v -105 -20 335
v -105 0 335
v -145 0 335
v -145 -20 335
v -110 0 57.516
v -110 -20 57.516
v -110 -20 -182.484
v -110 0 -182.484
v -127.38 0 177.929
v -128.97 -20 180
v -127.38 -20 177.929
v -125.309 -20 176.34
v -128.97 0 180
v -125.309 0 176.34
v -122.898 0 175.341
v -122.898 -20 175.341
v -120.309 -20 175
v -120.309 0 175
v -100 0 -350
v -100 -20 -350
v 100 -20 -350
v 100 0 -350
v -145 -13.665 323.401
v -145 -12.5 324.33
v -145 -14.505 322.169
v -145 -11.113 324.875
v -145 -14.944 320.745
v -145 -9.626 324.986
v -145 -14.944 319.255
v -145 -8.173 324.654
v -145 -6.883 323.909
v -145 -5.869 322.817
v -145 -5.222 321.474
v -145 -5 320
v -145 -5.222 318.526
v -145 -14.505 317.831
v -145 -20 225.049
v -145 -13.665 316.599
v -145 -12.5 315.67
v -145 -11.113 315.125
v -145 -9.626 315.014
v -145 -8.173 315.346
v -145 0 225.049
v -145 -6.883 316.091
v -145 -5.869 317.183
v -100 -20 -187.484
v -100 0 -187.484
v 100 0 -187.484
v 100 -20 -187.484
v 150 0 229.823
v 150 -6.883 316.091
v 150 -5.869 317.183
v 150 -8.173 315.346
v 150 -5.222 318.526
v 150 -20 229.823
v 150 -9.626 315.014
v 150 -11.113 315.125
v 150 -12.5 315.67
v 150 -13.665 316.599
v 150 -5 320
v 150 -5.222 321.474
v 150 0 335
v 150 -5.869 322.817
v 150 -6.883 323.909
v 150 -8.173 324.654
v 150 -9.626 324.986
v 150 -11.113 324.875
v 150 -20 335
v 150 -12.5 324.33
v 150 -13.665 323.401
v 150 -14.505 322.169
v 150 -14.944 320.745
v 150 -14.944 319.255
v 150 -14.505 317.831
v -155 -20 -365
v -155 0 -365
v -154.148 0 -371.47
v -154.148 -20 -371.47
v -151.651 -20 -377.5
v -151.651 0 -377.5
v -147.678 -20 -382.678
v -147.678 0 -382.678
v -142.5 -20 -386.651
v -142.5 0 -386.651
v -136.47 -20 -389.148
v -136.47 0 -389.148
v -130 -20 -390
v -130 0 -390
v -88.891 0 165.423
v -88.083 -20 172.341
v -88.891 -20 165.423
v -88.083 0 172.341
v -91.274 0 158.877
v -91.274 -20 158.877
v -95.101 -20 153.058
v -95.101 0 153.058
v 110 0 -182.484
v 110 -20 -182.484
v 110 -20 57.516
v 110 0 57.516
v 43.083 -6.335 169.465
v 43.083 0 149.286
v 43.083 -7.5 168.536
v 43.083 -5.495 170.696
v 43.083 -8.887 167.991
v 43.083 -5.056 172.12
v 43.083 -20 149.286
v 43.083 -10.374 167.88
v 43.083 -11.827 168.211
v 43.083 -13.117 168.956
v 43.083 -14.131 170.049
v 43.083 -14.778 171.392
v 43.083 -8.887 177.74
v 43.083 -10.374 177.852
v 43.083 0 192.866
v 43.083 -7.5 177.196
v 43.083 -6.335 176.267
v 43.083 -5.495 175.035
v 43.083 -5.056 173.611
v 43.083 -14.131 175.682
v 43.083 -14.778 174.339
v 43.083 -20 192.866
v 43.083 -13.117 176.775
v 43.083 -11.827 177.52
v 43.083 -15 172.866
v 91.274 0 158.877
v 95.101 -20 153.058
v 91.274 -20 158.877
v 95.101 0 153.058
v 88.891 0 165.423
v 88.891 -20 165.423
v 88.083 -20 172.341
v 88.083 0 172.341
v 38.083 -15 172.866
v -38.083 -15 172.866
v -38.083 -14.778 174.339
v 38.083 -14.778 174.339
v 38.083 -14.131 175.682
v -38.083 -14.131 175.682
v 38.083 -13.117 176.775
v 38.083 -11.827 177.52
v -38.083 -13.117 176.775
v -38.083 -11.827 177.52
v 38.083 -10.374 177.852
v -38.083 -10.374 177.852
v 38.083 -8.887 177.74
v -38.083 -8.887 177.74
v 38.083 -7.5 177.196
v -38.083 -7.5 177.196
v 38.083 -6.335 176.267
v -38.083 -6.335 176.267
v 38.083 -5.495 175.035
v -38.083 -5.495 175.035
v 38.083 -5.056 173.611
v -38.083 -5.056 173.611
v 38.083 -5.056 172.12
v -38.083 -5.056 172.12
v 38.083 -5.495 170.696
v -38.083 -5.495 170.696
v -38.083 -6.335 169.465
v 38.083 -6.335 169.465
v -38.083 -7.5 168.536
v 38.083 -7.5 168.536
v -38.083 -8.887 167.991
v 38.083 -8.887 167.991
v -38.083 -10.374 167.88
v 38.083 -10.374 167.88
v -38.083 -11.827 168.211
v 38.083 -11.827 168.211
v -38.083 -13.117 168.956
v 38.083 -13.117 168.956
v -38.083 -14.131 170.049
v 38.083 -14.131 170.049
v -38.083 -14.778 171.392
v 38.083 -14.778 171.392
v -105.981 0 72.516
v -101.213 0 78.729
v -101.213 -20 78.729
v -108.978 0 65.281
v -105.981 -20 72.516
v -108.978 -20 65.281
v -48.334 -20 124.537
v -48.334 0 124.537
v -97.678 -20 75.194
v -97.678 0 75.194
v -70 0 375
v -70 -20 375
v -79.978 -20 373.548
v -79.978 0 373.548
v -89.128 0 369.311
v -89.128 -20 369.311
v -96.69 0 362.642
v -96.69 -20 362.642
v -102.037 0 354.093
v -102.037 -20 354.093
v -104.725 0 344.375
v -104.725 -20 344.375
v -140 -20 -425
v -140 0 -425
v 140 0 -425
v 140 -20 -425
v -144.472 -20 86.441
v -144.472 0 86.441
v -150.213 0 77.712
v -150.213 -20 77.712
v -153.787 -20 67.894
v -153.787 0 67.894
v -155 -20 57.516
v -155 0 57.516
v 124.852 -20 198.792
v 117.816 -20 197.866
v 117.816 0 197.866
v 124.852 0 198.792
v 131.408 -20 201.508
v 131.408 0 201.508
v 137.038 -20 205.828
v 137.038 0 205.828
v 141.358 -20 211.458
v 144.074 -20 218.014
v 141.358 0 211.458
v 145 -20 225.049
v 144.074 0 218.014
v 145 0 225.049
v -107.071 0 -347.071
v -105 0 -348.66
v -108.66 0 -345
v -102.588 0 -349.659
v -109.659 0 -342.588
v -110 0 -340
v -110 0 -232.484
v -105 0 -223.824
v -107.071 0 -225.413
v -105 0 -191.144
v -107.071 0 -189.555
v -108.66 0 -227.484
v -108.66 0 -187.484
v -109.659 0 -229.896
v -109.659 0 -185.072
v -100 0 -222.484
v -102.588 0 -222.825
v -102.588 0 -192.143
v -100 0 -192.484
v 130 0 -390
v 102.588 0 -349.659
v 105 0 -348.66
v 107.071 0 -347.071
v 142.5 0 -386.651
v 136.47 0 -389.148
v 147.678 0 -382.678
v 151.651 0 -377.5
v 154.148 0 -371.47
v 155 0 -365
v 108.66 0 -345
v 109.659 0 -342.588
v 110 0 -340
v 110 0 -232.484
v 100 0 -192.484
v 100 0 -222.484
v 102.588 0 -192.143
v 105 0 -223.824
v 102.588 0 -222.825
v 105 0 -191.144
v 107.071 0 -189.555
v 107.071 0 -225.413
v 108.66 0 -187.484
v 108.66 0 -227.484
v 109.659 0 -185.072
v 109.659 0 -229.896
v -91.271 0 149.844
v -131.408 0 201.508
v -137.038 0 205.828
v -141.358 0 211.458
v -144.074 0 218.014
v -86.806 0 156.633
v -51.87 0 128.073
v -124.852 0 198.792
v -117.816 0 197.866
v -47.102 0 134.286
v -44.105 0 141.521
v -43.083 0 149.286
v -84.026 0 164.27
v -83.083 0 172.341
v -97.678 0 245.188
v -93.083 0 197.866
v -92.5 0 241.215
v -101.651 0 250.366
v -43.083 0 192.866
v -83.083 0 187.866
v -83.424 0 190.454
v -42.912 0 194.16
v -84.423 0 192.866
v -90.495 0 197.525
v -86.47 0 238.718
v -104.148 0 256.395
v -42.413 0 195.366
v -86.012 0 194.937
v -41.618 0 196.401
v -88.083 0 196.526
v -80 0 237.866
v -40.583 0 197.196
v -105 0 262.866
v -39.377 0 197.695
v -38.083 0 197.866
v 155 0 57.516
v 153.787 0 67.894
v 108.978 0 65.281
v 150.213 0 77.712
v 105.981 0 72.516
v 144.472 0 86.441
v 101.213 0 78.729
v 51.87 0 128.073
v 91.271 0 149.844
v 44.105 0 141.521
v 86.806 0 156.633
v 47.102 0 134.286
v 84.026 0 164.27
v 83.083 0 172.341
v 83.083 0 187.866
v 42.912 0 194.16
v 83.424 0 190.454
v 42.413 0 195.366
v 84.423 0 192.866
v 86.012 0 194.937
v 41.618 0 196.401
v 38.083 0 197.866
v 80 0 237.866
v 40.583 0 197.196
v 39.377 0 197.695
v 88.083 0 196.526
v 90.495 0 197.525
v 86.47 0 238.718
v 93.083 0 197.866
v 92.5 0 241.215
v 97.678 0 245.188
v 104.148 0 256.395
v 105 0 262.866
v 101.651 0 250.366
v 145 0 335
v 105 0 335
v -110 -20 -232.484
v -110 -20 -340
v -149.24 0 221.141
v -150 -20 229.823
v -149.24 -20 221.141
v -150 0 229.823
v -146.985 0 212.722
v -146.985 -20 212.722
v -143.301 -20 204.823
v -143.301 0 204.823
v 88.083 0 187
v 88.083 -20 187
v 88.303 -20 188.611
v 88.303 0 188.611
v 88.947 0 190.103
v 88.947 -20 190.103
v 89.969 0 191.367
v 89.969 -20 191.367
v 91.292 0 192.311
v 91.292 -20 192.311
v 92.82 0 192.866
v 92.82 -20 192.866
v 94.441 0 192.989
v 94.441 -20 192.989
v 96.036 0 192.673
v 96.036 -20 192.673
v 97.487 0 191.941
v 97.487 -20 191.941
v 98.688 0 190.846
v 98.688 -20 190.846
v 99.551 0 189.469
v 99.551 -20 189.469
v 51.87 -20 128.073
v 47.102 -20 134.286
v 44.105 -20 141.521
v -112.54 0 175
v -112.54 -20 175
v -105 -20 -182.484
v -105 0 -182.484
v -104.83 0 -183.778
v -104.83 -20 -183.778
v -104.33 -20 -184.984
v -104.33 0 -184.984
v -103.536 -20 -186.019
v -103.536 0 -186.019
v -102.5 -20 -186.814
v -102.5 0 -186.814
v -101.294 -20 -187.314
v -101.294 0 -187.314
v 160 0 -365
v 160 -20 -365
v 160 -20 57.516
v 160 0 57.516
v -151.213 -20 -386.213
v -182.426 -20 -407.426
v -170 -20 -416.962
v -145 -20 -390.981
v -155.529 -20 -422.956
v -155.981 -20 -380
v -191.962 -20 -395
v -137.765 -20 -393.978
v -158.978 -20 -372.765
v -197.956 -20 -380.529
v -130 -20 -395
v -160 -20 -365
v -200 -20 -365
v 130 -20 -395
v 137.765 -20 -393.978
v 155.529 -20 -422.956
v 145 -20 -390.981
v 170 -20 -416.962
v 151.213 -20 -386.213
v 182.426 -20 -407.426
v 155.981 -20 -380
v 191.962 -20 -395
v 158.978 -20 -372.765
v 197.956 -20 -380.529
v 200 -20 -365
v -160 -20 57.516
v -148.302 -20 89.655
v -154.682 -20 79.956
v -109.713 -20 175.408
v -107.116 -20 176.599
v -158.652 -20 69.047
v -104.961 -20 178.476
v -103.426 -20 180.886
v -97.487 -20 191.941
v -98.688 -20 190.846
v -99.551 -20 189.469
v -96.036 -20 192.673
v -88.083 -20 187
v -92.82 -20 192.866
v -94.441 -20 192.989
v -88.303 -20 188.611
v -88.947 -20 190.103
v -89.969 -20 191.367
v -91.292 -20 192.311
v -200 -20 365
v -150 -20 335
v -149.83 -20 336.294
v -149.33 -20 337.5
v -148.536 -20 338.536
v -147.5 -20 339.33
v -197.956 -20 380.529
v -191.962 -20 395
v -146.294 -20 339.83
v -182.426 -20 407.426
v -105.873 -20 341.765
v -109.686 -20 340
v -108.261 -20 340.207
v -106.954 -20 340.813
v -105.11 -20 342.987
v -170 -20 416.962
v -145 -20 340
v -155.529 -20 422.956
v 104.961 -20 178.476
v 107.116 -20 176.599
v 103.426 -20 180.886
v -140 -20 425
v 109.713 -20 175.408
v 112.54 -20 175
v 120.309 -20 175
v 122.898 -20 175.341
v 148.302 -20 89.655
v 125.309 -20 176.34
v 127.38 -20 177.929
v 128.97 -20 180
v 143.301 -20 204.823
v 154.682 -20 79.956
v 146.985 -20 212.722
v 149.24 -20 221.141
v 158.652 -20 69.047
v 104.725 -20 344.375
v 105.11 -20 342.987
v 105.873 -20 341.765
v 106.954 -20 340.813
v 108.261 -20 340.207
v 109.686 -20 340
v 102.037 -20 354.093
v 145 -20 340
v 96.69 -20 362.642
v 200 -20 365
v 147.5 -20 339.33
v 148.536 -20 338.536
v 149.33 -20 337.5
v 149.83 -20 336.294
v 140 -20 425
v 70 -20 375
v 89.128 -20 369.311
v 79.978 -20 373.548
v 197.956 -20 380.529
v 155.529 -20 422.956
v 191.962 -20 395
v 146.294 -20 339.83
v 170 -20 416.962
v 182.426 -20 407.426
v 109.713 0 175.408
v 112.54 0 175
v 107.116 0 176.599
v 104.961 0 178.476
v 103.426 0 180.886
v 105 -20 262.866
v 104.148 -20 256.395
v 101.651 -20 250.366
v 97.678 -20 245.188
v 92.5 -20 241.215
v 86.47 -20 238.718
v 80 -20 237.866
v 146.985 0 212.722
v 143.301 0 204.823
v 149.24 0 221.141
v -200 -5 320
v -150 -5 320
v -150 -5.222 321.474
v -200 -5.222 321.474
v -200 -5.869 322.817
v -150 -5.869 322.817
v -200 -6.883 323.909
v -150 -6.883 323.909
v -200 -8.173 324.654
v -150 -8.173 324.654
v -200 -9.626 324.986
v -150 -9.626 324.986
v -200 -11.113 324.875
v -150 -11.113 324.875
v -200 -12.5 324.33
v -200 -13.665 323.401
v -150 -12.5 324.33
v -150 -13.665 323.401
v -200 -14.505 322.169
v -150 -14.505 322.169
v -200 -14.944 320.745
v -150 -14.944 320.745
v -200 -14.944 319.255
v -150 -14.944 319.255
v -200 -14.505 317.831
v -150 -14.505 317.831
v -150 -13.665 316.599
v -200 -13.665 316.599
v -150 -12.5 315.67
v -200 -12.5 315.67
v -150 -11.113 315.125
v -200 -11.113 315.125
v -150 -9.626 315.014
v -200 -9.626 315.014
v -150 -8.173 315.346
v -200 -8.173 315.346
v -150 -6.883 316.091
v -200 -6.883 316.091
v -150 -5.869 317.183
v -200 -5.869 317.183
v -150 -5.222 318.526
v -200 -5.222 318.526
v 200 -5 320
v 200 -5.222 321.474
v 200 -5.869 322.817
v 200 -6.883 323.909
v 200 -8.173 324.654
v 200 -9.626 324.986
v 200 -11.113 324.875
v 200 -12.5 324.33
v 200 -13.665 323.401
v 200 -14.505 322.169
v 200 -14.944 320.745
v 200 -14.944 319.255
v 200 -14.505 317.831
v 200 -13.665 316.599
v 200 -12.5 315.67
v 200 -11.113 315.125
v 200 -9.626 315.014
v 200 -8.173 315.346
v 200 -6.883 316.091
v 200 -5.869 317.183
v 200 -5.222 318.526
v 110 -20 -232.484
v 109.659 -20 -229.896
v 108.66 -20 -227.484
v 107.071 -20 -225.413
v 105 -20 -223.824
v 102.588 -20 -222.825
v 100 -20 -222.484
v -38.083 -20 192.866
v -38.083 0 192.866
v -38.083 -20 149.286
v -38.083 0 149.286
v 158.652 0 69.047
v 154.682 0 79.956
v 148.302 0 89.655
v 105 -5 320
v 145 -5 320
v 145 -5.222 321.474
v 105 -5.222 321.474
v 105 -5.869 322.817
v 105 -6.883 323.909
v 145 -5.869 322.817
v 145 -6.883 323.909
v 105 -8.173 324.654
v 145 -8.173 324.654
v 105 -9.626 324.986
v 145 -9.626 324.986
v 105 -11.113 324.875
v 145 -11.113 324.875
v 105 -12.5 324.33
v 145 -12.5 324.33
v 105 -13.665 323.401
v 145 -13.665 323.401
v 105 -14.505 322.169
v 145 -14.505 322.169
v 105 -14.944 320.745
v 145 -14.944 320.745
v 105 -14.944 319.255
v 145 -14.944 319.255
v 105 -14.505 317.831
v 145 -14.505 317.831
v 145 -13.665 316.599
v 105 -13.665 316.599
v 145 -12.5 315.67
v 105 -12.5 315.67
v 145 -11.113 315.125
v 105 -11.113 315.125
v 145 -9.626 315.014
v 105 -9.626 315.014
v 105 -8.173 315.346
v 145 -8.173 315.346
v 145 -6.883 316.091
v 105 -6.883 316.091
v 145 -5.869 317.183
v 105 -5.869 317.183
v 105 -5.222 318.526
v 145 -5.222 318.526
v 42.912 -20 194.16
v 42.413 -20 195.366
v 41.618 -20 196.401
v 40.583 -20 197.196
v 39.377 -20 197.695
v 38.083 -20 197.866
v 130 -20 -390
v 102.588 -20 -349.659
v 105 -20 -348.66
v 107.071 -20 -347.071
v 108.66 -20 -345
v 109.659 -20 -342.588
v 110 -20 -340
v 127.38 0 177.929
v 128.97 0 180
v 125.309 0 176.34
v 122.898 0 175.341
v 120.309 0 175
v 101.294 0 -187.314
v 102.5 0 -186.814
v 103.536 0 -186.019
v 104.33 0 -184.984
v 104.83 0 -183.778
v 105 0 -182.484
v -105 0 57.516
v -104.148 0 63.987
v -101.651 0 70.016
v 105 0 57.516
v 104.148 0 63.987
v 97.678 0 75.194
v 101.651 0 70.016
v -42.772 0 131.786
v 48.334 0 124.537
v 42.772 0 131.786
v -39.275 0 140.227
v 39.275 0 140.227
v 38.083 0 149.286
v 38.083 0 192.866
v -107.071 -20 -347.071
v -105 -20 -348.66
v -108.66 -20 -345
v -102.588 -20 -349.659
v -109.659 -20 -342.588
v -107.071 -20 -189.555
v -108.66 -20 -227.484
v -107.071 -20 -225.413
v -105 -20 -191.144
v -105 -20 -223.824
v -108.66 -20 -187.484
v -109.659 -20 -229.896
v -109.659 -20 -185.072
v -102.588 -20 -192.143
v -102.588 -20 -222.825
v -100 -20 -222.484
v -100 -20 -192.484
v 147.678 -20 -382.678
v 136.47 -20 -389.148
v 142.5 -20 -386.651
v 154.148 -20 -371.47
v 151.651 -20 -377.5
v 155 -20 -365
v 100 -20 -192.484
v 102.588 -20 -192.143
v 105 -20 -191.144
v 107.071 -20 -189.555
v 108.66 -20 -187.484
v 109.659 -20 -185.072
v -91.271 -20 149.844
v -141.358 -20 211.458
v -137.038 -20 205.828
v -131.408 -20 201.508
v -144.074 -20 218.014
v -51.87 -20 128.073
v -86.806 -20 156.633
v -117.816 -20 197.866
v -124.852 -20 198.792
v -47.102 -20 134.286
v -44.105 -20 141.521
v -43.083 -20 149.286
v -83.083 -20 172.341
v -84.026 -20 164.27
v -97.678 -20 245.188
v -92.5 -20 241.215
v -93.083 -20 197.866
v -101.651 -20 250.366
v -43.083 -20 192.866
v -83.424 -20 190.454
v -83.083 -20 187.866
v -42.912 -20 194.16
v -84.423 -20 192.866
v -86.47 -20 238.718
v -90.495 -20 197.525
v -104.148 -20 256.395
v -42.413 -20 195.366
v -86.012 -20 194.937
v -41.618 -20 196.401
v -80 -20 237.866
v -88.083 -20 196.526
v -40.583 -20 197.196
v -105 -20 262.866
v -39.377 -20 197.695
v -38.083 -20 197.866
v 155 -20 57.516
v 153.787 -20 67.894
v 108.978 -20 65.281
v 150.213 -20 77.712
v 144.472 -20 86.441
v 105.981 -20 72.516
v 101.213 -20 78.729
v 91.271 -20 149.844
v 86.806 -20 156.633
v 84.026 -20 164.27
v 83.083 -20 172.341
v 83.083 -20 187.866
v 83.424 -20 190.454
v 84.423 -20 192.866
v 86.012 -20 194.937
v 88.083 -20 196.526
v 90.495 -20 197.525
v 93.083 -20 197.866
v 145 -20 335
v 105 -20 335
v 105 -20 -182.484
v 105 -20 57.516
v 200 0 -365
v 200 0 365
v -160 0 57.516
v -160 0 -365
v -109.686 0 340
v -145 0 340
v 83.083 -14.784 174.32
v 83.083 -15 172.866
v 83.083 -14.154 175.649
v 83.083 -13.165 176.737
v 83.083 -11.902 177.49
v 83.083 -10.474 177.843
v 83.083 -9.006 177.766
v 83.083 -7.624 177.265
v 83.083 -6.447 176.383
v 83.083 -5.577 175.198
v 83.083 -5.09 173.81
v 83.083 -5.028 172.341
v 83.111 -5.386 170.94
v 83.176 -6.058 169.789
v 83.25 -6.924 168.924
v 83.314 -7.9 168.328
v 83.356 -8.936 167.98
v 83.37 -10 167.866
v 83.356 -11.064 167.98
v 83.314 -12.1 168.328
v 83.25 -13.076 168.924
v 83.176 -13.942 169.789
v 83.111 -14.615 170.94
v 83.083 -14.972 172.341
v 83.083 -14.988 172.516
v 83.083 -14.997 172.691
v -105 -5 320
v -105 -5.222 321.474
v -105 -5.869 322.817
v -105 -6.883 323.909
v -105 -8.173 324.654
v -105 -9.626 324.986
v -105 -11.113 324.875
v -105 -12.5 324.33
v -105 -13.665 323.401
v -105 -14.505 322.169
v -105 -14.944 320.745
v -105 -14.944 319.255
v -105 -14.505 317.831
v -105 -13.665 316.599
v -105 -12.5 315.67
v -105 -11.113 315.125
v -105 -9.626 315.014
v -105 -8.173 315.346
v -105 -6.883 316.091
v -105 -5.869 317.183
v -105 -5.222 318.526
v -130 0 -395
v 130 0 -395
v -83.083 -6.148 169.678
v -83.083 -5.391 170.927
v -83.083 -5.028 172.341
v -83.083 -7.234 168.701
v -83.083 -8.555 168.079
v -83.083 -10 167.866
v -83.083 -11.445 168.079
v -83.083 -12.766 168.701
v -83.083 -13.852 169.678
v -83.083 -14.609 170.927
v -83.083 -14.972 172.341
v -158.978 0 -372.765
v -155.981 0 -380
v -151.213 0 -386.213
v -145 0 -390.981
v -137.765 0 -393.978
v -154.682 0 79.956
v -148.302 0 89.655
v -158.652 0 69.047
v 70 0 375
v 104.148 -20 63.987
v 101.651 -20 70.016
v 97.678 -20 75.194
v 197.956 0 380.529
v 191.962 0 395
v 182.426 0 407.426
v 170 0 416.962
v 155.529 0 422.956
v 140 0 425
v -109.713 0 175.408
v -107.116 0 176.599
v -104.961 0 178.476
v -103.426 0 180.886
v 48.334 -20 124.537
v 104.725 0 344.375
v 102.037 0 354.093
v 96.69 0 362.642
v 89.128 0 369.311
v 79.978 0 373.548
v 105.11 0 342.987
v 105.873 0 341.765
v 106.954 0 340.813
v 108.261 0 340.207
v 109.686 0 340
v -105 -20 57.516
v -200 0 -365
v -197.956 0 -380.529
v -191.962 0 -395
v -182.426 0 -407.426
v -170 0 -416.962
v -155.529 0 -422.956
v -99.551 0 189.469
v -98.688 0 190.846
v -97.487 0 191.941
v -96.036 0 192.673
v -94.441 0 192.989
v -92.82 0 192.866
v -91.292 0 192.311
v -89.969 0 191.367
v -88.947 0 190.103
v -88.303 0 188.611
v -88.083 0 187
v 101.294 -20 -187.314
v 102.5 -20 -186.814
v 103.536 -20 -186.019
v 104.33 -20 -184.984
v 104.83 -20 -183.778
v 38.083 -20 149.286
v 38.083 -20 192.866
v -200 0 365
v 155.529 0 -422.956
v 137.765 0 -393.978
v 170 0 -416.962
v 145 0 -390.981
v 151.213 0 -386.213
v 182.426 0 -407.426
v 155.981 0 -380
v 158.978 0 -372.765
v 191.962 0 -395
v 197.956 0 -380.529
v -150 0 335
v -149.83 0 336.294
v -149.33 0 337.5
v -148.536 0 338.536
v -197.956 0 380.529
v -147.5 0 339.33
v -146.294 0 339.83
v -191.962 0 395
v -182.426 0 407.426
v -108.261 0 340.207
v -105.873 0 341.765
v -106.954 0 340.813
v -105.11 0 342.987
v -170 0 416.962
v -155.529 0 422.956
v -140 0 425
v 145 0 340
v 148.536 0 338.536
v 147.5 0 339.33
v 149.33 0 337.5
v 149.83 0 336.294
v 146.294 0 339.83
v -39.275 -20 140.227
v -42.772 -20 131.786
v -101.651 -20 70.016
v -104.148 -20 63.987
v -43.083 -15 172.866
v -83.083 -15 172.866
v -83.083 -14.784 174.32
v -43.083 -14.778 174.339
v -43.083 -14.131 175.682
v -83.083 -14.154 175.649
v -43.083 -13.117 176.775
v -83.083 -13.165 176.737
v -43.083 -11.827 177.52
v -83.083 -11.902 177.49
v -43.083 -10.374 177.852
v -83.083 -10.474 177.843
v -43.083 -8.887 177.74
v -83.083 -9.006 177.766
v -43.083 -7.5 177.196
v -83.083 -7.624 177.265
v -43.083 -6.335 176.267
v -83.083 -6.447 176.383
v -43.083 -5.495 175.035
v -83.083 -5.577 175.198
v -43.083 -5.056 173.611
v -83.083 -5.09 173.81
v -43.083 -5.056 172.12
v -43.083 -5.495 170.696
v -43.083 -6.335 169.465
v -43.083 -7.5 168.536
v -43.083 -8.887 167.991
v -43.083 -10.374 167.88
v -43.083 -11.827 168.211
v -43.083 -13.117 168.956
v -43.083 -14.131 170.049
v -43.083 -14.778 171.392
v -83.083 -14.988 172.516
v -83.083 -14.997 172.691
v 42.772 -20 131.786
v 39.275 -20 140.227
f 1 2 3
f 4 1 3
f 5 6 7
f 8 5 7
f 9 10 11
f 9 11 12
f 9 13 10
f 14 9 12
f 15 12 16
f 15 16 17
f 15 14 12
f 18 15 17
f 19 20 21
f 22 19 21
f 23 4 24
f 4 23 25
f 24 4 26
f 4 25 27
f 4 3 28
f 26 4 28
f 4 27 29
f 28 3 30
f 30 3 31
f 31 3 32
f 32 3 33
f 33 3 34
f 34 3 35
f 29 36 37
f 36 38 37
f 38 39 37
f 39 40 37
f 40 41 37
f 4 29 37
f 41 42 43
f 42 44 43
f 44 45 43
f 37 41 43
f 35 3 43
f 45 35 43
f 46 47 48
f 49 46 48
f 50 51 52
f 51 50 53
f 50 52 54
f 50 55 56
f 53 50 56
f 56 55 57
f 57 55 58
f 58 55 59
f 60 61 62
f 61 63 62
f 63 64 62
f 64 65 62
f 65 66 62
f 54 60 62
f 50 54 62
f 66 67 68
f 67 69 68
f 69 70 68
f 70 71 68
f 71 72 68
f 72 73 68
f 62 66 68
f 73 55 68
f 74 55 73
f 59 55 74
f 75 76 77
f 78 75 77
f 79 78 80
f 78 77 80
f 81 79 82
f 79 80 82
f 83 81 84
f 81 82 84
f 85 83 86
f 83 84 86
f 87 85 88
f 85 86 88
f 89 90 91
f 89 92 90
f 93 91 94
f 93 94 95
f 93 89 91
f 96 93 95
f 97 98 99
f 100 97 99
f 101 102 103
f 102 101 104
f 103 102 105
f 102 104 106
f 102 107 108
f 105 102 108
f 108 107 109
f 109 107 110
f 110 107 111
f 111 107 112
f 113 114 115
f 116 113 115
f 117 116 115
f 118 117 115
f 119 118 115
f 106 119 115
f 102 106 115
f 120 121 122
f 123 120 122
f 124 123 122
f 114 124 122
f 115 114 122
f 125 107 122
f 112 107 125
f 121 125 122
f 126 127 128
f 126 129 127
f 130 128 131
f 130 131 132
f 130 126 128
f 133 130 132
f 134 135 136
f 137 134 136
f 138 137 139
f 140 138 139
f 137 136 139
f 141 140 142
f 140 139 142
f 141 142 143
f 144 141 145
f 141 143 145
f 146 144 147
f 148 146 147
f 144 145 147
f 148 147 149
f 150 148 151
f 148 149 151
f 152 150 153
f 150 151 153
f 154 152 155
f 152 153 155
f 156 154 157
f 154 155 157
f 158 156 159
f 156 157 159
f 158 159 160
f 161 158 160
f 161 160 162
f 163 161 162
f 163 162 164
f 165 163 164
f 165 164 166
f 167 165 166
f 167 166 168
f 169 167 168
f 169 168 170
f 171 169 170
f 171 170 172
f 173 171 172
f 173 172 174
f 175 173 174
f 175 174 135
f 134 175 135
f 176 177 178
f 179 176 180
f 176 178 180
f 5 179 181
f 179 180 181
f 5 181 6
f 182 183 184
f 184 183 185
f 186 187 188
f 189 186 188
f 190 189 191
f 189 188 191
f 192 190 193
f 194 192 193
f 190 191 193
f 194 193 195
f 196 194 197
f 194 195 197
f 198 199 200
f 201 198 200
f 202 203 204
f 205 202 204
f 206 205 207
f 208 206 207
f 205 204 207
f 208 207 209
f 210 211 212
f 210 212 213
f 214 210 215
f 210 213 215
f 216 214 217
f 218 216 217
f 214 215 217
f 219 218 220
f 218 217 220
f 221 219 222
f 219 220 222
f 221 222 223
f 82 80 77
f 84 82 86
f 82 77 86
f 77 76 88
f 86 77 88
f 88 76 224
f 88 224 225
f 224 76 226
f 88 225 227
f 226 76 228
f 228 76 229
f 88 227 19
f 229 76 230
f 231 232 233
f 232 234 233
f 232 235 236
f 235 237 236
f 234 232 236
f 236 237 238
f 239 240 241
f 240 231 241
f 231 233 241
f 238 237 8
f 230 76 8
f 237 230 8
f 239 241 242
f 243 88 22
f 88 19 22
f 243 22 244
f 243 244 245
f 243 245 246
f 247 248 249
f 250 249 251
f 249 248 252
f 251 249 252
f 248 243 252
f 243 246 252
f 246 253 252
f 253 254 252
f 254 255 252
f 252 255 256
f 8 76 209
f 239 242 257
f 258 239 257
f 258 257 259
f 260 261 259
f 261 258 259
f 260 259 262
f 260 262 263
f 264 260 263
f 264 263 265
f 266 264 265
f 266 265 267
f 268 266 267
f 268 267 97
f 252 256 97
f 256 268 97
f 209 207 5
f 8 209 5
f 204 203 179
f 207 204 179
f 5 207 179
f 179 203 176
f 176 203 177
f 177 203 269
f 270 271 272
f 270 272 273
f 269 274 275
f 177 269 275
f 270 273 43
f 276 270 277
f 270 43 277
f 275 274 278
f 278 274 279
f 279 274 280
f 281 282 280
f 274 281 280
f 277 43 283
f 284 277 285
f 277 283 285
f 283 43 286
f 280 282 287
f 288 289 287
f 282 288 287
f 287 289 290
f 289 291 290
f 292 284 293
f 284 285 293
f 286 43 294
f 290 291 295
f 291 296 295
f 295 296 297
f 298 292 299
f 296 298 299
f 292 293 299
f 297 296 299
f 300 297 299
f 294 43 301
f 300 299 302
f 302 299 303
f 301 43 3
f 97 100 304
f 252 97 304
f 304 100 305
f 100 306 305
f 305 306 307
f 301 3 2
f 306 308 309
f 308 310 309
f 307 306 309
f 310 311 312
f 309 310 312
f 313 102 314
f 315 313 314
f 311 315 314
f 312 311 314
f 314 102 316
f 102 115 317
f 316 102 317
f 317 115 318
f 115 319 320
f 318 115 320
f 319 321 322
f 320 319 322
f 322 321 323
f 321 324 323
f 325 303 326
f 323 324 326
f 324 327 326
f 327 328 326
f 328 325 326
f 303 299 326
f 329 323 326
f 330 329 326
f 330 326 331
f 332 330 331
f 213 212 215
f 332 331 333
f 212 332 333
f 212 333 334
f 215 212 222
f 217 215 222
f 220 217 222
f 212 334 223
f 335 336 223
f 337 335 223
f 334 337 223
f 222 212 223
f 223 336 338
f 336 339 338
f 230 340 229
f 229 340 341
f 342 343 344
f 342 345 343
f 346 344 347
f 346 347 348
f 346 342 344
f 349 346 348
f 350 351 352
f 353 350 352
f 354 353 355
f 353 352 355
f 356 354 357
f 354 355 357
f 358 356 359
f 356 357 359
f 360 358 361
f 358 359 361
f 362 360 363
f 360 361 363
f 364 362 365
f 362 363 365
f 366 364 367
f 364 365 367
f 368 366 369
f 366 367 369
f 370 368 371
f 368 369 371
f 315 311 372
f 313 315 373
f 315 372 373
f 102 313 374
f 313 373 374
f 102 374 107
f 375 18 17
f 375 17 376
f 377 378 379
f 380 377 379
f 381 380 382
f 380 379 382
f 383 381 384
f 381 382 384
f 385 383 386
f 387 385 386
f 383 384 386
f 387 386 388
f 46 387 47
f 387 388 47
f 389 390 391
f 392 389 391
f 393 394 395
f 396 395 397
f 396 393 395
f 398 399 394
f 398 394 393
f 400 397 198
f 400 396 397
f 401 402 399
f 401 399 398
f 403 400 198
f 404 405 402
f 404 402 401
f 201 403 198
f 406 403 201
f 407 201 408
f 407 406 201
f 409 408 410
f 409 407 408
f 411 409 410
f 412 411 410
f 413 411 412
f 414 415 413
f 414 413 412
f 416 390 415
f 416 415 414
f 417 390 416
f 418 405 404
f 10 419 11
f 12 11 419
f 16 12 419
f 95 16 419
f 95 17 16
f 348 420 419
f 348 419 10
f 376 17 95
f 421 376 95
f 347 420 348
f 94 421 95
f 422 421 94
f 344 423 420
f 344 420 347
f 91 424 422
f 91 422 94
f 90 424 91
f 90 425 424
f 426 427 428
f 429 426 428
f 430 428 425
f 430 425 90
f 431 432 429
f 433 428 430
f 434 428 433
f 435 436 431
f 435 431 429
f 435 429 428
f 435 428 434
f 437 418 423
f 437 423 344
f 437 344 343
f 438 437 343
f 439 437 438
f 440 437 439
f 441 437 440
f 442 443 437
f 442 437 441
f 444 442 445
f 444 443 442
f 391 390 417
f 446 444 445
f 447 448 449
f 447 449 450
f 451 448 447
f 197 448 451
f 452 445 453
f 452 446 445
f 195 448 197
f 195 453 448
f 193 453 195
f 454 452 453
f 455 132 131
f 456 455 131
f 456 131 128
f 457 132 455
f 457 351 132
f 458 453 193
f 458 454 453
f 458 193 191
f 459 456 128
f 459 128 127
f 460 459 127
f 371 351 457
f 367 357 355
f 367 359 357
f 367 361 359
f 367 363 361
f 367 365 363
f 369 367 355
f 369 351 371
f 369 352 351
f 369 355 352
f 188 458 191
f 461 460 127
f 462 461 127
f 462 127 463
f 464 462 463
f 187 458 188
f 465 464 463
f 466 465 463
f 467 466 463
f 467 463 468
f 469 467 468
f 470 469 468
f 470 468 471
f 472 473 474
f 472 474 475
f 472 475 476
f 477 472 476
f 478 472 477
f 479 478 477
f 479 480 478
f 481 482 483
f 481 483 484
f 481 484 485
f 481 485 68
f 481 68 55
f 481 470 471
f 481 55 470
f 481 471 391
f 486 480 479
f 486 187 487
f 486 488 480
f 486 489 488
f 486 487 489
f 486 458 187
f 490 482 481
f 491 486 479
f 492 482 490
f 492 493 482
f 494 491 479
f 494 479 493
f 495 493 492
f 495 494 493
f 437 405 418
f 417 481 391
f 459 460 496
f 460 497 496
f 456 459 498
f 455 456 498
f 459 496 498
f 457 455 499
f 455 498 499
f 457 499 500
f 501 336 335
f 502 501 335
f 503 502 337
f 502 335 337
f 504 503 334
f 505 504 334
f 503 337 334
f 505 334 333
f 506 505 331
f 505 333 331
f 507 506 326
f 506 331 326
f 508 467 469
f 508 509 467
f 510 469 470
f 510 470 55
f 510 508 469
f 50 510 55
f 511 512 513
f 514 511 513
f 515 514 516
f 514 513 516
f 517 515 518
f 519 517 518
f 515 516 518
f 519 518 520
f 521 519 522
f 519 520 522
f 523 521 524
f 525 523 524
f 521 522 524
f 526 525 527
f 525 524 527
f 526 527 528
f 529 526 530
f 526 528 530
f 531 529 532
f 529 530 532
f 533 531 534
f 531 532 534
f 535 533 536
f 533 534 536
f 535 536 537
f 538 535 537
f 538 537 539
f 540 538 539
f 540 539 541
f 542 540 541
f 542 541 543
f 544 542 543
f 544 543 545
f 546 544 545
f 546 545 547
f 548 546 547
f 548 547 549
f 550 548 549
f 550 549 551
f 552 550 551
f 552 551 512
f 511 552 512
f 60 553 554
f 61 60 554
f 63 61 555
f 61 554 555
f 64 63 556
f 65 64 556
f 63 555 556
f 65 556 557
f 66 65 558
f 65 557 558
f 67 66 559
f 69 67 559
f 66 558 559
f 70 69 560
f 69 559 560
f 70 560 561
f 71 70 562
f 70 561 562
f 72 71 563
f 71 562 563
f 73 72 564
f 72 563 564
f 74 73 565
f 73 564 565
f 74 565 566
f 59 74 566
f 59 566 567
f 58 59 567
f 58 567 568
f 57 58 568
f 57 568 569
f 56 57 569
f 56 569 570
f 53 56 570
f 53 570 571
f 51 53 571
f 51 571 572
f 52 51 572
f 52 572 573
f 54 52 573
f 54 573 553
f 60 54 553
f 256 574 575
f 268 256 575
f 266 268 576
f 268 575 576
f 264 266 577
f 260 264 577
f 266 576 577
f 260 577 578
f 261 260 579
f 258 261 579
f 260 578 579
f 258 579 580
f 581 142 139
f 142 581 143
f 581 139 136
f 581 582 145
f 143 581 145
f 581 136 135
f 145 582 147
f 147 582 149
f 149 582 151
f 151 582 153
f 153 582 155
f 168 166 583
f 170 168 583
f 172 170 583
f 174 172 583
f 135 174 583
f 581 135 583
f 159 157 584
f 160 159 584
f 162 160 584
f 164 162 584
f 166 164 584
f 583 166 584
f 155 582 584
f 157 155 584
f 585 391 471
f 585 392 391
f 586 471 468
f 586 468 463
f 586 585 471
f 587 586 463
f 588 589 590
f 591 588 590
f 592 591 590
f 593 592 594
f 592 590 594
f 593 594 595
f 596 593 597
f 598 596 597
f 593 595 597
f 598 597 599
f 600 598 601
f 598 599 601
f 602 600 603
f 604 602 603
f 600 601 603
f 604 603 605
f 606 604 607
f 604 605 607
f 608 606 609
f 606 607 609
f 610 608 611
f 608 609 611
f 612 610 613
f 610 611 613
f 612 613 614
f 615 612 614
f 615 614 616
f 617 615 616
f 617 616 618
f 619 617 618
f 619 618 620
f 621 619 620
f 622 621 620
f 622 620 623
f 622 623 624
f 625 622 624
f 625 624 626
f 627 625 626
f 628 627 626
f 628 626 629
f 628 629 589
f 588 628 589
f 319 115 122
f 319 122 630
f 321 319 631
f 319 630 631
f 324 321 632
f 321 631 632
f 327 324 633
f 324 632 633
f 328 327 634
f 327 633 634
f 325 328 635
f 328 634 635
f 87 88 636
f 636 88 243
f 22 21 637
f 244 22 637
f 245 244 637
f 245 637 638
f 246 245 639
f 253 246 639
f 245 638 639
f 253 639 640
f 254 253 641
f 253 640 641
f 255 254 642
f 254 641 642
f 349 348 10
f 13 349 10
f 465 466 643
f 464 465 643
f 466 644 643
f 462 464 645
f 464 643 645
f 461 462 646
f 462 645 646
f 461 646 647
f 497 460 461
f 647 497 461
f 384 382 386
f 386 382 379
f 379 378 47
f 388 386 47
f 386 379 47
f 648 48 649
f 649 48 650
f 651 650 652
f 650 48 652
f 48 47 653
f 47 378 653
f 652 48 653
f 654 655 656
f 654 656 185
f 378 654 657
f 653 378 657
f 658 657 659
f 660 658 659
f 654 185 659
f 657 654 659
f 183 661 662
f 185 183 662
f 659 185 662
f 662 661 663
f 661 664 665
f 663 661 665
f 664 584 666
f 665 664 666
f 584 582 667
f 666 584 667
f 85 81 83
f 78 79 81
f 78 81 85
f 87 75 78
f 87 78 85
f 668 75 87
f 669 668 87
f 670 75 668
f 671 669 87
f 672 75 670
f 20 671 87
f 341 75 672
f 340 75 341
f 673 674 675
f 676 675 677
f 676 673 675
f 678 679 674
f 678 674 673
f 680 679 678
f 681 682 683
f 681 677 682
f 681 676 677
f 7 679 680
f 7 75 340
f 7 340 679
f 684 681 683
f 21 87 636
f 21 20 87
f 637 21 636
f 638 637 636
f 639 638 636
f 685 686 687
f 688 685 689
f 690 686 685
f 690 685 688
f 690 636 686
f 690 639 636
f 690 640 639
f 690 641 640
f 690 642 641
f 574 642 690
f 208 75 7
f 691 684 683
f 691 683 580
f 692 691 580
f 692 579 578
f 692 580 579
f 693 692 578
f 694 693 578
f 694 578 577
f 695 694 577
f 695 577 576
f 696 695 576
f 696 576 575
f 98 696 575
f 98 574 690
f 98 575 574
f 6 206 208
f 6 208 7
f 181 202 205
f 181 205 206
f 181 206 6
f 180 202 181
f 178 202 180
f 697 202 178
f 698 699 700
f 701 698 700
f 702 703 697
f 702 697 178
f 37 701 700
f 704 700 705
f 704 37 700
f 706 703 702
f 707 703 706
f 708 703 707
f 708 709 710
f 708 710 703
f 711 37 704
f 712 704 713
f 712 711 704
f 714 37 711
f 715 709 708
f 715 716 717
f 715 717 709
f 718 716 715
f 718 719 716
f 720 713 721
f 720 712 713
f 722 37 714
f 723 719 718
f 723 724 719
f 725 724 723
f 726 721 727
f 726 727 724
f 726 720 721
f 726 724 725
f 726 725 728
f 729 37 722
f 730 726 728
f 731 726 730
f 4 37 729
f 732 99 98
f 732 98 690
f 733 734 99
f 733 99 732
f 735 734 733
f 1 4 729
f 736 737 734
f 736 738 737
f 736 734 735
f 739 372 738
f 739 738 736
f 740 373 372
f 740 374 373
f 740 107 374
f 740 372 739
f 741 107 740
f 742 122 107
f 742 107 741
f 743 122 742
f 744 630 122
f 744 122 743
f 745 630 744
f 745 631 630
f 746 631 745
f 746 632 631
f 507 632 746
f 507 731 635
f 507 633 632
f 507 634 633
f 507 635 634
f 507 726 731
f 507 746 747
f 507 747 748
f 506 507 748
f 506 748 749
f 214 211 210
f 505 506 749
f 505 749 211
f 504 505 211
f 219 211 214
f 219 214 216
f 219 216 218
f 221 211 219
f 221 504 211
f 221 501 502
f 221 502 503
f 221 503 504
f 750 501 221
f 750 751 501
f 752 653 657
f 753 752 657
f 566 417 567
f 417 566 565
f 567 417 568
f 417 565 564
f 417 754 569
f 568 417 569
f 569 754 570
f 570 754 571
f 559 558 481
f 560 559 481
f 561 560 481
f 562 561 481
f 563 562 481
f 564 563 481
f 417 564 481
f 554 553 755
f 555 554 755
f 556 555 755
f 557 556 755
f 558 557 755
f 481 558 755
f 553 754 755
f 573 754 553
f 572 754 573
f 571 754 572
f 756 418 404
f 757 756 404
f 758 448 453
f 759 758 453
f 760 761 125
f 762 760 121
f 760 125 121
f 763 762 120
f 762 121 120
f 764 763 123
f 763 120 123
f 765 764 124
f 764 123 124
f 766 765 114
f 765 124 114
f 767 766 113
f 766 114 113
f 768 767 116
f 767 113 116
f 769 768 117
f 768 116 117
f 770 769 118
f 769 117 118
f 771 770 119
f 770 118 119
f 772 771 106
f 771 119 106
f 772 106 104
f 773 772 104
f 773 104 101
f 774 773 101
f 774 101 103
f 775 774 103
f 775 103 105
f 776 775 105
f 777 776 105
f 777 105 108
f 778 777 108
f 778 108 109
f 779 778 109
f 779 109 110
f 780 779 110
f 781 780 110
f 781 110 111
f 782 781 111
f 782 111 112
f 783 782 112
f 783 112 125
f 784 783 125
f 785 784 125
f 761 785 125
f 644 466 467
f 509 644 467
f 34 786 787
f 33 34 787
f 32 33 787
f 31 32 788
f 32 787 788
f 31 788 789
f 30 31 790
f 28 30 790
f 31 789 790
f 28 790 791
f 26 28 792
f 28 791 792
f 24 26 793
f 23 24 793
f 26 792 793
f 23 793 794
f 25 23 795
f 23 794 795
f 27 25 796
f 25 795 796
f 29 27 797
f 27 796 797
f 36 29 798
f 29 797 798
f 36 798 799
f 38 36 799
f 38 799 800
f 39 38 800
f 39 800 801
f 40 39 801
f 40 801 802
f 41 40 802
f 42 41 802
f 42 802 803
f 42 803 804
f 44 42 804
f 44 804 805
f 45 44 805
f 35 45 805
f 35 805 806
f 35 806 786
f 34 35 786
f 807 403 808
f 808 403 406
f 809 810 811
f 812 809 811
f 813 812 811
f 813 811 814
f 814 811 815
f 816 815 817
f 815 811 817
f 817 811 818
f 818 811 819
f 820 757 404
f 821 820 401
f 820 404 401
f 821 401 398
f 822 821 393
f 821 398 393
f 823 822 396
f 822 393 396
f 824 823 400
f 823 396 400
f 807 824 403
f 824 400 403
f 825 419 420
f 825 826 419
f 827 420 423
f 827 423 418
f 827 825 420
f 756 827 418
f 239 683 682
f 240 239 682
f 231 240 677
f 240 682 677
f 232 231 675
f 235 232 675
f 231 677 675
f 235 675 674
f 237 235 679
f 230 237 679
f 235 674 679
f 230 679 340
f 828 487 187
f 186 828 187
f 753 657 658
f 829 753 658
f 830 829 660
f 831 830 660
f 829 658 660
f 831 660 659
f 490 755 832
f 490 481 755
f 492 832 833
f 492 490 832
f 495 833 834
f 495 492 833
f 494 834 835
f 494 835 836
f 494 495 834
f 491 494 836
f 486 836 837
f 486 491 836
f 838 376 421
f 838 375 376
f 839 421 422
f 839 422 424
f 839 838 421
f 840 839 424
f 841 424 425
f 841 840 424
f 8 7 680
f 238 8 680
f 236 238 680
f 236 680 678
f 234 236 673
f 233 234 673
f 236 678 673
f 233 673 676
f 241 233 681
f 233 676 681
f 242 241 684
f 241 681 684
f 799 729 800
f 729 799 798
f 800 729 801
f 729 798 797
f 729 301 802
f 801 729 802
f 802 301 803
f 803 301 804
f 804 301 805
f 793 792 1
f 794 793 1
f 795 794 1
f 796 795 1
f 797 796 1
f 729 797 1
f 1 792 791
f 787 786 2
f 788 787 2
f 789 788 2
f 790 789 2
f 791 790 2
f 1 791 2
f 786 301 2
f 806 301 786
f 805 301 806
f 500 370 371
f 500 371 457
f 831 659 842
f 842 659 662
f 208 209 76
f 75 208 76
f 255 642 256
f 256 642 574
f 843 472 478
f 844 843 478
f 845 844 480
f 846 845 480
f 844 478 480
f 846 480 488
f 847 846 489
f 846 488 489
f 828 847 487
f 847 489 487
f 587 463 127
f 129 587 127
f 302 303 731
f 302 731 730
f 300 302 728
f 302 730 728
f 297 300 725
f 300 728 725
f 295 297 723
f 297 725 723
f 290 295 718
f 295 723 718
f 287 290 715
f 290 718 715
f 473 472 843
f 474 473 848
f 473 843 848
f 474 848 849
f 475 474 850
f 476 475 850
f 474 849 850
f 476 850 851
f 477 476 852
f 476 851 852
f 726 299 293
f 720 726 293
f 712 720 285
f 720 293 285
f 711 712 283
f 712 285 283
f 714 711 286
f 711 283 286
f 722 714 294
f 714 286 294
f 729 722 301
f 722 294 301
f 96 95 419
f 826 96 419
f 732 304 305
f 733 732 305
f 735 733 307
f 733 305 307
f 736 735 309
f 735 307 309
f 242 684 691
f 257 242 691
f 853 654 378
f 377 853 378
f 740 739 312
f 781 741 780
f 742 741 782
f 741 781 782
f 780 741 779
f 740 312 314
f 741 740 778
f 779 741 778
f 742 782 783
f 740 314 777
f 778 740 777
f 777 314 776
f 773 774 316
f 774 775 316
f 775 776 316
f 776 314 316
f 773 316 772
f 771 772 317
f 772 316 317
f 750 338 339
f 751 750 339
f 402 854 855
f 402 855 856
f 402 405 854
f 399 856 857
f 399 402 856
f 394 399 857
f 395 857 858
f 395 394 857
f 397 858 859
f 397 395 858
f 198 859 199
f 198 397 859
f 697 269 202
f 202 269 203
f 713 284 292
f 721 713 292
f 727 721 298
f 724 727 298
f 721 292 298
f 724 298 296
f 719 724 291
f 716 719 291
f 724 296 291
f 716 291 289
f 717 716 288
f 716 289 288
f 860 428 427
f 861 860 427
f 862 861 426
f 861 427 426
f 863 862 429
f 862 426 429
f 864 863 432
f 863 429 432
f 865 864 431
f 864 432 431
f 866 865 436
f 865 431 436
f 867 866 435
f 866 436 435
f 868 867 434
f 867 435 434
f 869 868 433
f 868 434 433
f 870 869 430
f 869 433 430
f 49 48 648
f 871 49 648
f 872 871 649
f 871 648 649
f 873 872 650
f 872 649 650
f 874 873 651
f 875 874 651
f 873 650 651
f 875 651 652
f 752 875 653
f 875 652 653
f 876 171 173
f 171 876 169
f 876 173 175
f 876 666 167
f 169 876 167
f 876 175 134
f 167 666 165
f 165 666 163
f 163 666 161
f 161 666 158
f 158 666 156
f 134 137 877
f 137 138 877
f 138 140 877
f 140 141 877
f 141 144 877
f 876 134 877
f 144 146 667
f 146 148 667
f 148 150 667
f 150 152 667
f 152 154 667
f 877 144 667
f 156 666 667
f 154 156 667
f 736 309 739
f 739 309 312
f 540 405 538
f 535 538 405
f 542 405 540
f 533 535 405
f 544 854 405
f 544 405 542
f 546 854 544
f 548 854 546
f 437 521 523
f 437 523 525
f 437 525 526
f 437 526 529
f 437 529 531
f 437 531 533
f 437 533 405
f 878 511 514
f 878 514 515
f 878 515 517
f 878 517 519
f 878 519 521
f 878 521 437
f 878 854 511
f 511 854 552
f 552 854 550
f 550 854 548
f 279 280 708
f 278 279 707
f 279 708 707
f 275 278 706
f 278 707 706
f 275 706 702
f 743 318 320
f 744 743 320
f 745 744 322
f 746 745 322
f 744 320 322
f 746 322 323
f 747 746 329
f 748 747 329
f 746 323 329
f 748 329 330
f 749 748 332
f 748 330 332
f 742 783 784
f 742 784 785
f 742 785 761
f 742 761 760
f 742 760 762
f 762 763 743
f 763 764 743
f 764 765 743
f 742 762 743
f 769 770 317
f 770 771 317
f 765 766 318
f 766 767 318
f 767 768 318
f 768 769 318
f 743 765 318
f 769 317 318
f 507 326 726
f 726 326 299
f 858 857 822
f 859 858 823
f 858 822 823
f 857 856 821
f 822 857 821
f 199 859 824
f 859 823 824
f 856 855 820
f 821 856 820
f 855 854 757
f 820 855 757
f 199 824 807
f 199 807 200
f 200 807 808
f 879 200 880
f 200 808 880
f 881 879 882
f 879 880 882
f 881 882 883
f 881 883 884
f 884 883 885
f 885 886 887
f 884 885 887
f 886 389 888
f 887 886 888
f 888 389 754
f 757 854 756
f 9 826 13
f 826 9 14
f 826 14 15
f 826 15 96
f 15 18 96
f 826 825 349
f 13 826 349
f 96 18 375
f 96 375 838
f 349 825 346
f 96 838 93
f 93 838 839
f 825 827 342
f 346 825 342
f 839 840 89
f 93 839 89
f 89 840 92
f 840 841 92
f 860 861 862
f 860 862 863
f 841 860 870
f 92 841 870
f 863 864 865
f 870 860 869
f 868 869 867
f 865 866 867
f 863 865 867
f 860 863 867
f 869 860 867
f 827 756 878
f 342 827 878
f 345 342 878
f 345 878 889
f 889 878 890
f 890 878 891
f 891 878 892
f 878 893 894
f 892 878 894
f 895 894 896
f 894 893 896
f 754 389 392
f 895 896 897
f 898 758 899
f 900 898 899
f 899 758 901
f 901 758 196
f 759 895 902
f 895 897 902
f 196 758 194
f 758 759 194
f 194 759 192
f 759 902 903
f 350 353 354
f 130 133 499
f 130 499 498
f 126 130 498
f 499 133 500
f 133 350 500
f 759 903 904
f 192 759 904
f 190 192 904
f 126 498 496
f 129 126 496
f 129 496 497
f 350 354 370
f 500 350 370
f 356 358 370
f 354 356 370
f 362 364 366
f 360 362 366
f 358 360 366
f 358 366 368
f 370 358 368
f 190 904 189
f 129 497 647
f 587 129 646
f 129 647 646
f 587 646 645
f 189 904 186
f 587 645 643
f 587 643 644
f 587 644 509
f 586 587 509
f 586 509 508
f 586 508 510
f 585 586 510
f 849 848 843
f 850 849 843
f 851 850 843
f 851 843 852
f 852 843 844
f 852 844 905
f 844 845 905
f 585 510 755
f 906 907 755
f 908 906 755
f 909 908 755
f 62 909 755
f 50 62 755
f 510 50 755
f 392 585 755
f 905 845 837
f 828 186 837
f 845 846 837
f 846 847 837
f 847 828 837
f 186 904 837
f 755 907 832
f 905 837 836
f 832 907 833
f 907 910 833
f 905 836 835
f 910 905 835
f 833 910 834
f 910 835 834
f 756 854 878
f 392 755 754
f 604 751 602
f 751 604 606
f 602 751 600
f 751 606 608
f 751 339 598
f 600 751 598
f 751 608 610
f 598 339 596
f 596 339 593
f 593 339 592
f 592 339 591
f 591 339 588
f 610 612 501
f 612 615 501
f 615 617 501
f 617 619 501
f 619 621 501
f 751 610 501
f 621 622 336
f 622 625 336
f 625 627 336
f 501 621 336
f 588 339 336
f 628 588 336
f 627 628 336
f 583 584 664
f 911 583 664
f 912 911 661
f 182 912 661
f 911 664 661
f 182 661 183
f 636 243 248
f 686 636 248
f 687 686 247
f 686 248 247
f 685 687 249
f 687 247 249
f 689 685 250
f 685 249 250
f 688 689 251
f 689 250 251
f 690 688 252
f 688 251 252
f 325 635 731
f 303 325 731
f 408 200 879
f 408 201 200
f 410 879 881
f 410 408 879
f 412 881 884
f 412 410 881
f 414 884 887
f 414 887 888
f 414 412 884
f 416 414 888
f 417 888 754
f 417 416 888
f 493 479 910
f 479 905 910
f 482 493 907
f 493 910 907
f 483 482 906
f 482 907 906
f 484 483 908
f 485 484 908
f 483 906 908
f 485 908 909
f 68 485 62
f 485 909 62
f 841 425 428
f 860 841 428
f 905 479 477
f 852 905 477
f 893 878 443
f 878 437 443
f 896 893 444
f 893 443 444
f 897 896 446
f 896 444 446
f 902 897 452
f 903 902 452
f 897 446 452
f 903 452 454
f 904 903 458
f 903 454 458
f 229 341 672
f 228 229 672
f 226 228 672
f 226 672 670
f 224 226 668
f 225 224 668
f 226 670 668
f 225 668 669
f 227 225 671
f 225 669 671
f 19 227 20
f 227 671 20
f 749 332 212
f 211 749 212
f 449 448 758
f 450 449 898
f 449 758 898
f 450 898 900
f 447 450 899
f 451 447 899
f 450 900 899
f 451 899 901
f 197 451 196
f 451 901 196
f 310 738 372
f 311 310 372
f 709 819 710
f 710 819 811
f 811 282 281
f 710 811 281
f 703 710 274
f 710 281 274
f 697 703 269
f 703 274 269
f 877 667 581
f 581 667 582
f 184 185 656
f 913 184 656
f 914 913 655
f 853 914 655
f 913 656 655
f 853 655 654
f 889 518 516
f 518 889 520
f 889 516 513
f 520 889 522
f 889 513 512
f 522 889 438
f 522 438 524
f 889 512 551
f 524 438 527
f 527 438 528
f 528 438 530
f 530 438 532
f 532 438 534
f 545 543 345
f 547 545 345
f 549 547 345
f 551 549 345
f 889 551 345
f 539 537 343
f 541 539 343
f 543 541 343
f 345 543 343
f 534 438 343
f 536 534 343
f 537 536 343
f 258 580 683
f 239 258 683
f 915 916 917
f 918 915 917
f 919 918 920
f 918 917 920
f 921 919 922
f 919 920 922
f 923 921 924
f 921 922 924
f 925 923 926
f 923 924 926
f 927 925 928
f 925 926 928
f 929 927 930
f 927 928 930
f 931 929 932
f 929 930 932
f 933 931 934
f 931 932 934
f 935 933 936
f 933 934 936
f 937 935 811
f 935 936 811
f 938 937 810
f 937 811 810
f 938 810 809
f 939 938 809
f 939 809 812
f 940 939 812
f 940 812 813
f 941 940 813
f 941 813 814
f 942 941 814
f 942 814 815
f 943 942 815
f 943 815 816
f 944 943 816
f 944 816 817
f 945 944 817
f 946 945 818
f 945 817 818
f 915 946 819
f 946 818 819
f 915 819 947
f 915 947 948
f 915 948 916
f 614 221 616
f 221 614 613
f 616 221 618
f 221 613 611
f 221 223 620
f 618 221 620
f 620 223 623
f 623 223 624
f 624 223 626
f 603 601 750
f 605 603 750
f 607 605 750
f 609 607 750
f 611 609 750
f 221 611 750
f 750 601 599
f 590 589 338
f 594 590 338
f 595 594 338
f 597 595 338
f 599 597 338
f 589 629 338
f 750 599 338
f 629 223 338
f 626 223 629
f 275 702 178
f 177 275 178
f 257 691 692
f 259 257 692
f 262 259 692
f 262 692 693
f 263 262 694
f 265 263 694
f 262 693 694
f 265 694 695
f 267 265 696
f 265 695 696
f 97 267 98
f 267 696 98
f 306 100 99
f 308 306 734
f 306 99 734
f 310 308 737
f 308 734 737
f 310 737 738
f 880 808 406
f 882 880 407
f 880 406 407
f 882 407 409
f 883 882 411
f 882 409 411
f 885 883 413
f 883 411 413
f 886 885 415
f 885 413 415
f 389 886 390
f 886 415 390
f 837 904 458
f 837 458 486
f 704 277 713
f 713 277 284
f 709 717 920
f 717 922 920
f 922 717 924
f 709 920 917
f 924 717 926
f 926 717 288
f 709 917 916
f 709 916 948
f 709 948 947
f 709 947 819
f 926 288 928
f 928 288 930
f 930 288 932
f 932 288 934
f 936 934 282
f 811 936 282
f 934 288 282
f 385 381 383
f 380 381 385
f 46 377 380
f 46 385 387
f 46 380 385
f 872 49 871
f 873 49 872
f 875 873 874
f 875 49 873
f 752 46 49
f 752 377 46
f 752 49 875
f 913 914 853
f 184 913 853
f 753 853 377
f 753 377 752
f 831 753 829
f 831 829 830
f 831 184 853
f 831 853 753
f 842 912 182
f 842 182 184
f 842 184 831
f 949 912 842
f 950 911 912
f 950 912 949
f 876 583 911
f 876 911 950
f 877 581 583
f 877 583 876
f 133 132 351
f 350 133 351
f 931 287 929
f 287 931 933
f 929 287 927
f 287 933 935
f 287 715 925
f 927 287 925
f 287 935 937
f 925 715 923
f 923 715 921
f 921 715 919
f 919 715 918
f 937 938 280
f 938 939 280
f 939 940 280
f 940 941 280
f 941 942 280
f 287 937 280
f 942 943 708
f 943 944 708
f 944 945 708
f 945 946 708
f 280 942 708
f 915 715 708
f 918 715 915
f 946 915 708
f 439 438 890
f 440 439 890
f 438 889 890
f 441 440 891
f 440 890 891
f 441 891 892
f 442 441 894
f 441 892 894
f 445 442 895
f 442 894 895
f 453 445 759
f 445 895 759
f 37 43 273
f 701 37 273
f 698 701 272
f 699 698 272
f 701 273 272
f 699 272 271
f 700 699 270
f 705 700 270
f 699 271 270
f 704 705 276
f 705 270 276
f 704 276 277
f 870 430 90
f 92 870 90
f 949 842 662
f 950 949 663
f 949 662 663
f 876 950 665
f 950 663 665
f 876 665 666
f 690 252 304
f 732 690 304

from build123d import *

# Parameters (mm, degrees)
F0_W      = 400
F0_H      = 850
F1_DEPTH  = 20
F2_R      = 60
F4_DEPTH  = 20.001
F5_R      = 50
F6_R      = 10
F7_R      = 30
F8_R      = 50
F9_R      = 5
F11_DEPTH = 20
F13_DEPTH = 25
F15_DEPTH = 20.001
F17_DEPTH = 20
F19_D     = 10
F21_D     = 10
F21_DEPTH = 238.0838139666
F23_D     = 10
F25_D     = 10


with BuildPart() as f1:
    # F0 (on Front) → F1 (new body)
    with BuildSketch(Plane.XZ):
        Rectangle(F0_W, F0_H)
    extrude(amount=F1_DEPTH)

    # F2
    f2_edges = [f1.edges().sort_by_distance(p)[0] for p in [
        (200, -10, 425),
        (-200, -10, 425),
        (-200, -10, -425),
        (200, -10, -425),
    ]]
    fillet(f2_edges, radius=F2_R)

    # F3 (on face) → F4 (cut, through all)
    with BuildSketch(Plane.XZ.offset(20)):
        with BuildLine():
            Line((70, 375), (-70, 375))
            ThreePointArc((-70, 375), (-94.7487373415, 364.7487373415), (-105, 340))
            Line((-105, 340), (-150, 340))
            Line((-150, 340), (-150, 216.4257813839))
            Line((-150, 216.4257813839), (-126.0828139666, 175))
            Line((-126.0828139666, 175), (-106.0828139666, 175))
            Line((-106.0828139666, 175), (-99.5514409332, 189.4686269666))
            ThreePointArc((-99.5514409332, 189.4686269666), (-92.8202296723, 192.8656526406), (-88.0828139666, 187))
            Line((-88.0828139666, 187), (-88.0828139666, 161.4221185446))
            Line((-88.0828139666, 161.4221185446), (-160, 75.71455372))
            Line((-160, 75.71455372), (-160, -365))
            ThreePointArc((-160, -365), (-151.2132034356, -386.2132034356), (-130, -395))
            Line((-130, -395), (130, -395))
            ThreePointArc((130, -395), (151.2132034356, -386.2132034356), (160, -365))
            Line((160, -365), (160, 75.71455372))
            Line((160, 75.71455372), (88.0828139666, 161.4221185446))
            Line((88.0828139666, 161.4221185446), (88.0828139666, 187))
            ThreePointArc((88.0828139666, 187), (92.8202296723, 192.8656526406), (99.5514409332, 189.4686269666))
            Line((99.5514409332, 189.4686269666), (106.0828139666, 175))
            Line((106.0828139666, 175), (126.0828139666, 175))
            Line((126.0828139666, 175), (150, 216.4257813839))
            Line((150, 216.4257813839), (150, 340))
            Line((150, 340), (105, 340))
            ThreePointArc((105, 340), (94.7487373415, 364.7487373415), (70, 375))
        make_face()
    extrude(amount=-F4_DEPTH, mode=Mode.SUBTRACT)

    # F5
    f5_edges = [f1.edges().sort_by_distance(p)[0] for p in [
        (-150, -10, 216.425781),
        (150, -10, 216.425781),
    ]]
    fillet(f5_edges, radius=F5_R)

    # F6
    f6_edges = [f1.edges().sort_by_distance(p)[0] for p in [
        (126.082814, -10, 175),
        (-126.082814, -10, 175),
        (106.082814, -10, 175),
        (-106.082814, -10, 175),
    ]]
    fillet(f6_edges, radius=F6_R)

    # F7
    f7_edges = [f1.edges().sort_by_distance(p)[0] for p in [
        (-88.082814, -10, 161.422119),
        (88.082814, -10, 161.422119),
    ]]
    fillet(f7_edges, radius=F7_R)

    # F8
    f8_edges = [f1.edges().sort_by_distance(p)[0] for p in [
        (-160, -10, 75.714554),
        (160, -10, 75.714554),
    ]]
    fillet(f8_edges, radius=F8_R)

    # F9
    f9_edges = [f1.edges().sort_by_distance(p)[0] for p in [
        (-150, -10, 340),
        (-105, -10, 340),
        (150, -10, 340),
        (105, -10, 340),
    ]]
    fillet(f9_edges, radius=F9_R)

    # F25 (through all)
    with Locations(Plane(origin=(-200, 0, 0), x_dir=(0, -1, 0), z_dir=(-1, 0, 0))):
        with Locations((10, 320)):
            Hole(F25_D / 2)


with BuildPart() as f11:
    # F10 (on Front) → F11 (new body)
    with BuildSketch(Plane.XZ):
        with BuildLine():
            Line((-105, 262.8656526406), (-105, 335))
            Line((-105, 335), (-145, 335))
            Line((-145, 335), (-145, 225.0493870204))
            ThreePointArc((-145, 225.0493870204), (-137.0380685381, 205.8275841024), (-117.8162656202, 197.8656526406))
            Line((-117.8162656202, 197.8656526406), (-93.0828139666, 197.8656526406))
            ThreePointArc((-93.0828139666, 197.8656526406), (-86.0117461547, 194.9367204524), (-83.0828139666, 187.8656526406))
            Line((-83.0828139666, 187.8656526406), (-83.0828139666, 172.3412255726))
            ThreePointArc((-83.0828139666, 172.3412255726), (-85.1935722391, 160.3705205562), (-91.2712584574, 149.8436592335))
            Line((-91.2712584574, 149.8436592335), (-144.4719999404, 86.4414844426))
            ThreePointArc((-144.4719999404, 86.4414844426), (-152.2861679354, 72.9069484564), (-155, 57.5160420067))
            Line((-155, 57.5160420067), (-155, -365))
            ThreePointArc((-155, -365), (-147.6776695297, -382.6776695297), (-130, -390))
            Line((-130, -390), (0, -390))
            Line((0, -390), (130, -390))
            ThreePointArc((130, -390), (147.6776695297, -382.6776695297), (155, -365))
            Line((155, -365), (155, 57.5160420067))
            ThreePointArc((155, 57.5160420067), (152.2861679354, 72.9069484564), (144.4719999404, 86.4414844426))
            Line((144.4719999404, 86.4414844426), (91.2712584574, 149.8436592335))
            ThreePointArc((91.2712584574, 149.8436592335), (85.1935722391, 160.3705205562), (83.0828139666, 172.3412255726))
            Line((83.0828139666, 172.3412255726), (83.0828139666, 187.8656526406))
            ThreePointArc((83.0828139666, 187.8656526406), (86.0117461547, 194.9367204524), (93.0828139666, 197.8656526406))
            Line((93.0828139666, 197.8656526406), (117.8162656202, 197.8656526406))
            ThreePointArc((117.8162656202, 197.8656526406), (137.0380685381, 205.8275841024), (145, 225.0493870204))
            Line((145, 225.0493870204), (145, 335))
            Line((145, 335), (105, 335))
            Line((105, 335), (105, 262.8656526406))
            ThreePointArc((105, 262.8656526406), (97.6776695297, 245.1879831109), (80, 237.8656526406))
            Line((80, 237.8656526406), (0, 237.8656526406))
            Line((0, 237.8656526406), (-80, 237.8656526406))
            ThreePointArc((-80, 237.8656526406), (-97.6776695297, 245.1879831109), (-105, 262.8656526406))
        make_face()
    extrude(amount=F11_DEPTH)

    # F12 (on face) → F13 (cut)
    with BuildSketch(Plane.XZ.offset(20)):
        with BuildLine():
            Line((38.0828139666, 197.8656526406), (-38.0828139666, 197.8656526406))
            ThreePointArc((-38.0828139666, 197.8656526406), (-41.6183478725, 196.4011865465), (-43.0828139666, 192.8656526406))
            Line((-43.0828139666, 192.8656526406), (-43.0828139666, 149.2860417825))
            ThreePointArc((-43.0828139666, 149.2860417825), (-45.3664279913, 137.8055388115), (-51.869610531, 128.0728383469))
            Line((-51.869610531, 128.0728383469), (-101.2132034356, 78.7292454423))
            ThreePointArc((-101.2132034356, 78.7292454423), (-107.7163859753, 68.9965449777), (-110, 57.5160420067))
            Line((-110, 57.5160420067), (-110, -182.4839579933))
            ThreePointArc((-110, -182.4839579933), (-107.0710678119, -189.5550258052), (-100, -192.4839579933))
            Line((-100, -192.4839579933), (0, -192.4839579933))
            Line((0, -192.4839579933), (100, -192.4839579933))
            ThreePointArc((100, -192.4839579933), (107.0710678119, -189.5550258052), (110, -182.4839579933))
            Line((110, -182.4839579933), (110, 57.5160420067))
            ThreePointArc((110, 57.5160420067), (107.7163859753, 68.9965449777), (101.2132034356, 78.7292454423))
            Line((101.2132034356, 78.7292454423), (51.869610531, 128.0728383469))
            ThreePointArc((51.869610531, 128.0728383469), (45.3664279913, 137.8055388115), (43.0828139666, 149.2860417825))
            Line((43.0828139666, 149.2860417825), (43.0828139666, 192.8656526406))
            ThreePointArc((43.0828139666, 192.8656526406), (41.6183478725, 196.4011865465), (38.0828139666, 197.8656526406))
        make_face()
    extrude(amount=-F13_DEPTH, mode=Mode.SUBTRACT)

    # F14 (on face) → F15 (cut, through all)
    with BuildSketch(Plane.XZ.offset(20)):
        with BuildLine():
            Line((0, -222.4839579933), (-100, -222.4839579933))
            ThreePointArc((-100, -222.4839579933), (-107.0710678119, -225.4128901814), (-110, -232.4839579933))
            Line((-110, -232.4839579933), (-110, -340))
            ThreePointArc((-110, -340), (-107.0710678119, -347.0710678119), (-100, -350))
            Line((-100, -350), (0, -350))
            Line((0, -350), (0, -222.4839579933))
        make_face()
        with BuildLine():
            Line((100, -222.4839579933), (0, -222.4839579933))
            Line((0, -222.4839579933), (0, -350))
            Line((0, -350), (100, -350))
            ThreePointArc((100, -350), (107.0710678119, -347.0710678119), (110, -340))
            Line((110, -340), (110, -232.4839579933))
            ThreePointArc((110, -232.4839579933), (107.0710678119, -225.4128901814), (100, -222.4839579933))
        make_face()
    extrude(amount=-F15_DEPTH, mode=Mode.SUBTRACT)

    # F21 (through all, one way)
    with BuildSketch(Plane(origin=(-83.0828139666, 0, 0), x_dir=(0, -1, 0), z_dir=(-1, 0, 0))):
        with Locations((10, 172.8656526253)):
            Circle(F21_D / 2)
    extrude(amount=-F21_DEPTH, mode=Mode.SUBTRACT)

    # F23 (through all)
    with Locations(Plane(origin=(-145, 0, 0), x_dir=(0, -1, 0), z_dir=(-1, 0, 0))):
        with Locations((10, 320)):
            Hole(F23_D / 2)


with BuildPart() as f17:
    # F16 (on Front) → F17 (new body)
    with BuildSketch(Plane.XZ):
        with BuildLine():
            ThreePointArc((-38.0828139513, 149.2860417825), (-40.7470303146, 135.8921216438), (-48.3340766143, 124.5373044301))
            Line((-48.3340766143, 124.5373044301), (-97.6776695188, 75.1937115255))
            ThreePointArc((-97.6776695188, 75.1937115255), (-103.0969882986, 67.08312781), (-104.9999999847, 57.5160420067))
            Line((-104.9999999847, 57.5160420067), (-104.9999999847, -182.4839579933))
            ThreePointArc((-104.9999999847, -182.4839579933), (-103.5355338951, -186.0194918884), (-100, -187.483957978))
            Line((-100, -187.483957978), (100, -187.483957978))
            ThreePointArc((100, -187.483957978), (103.5355338951, -186.0194918884), (104.9999999847, -182.4839579933))
            Line((104.9999999847, -182.4839579933), (104.9999999847, 57.5160420067))
            ThreePointArc((104.9999999847, 57.5160420067), (103.0969882986, 67.08312781), (97.6776695188, 75.1937115255))
            Line((97.6776695188, 75.1937115255), (48.3340766143, 124.5373044301))
            ThreePointArc((48.3340766143, 124.5373044301), (40.7470303146, 135.8921216438), (38.0828139513, 149.2860417825))
            Line((38.0828139513, 149.2860417825), (38.0828139513, 192.8656526253))
            Line((38.0828139513, 192.8656526253), (-38.0828139513, 192.8656526253))
            Line((-38.0828139513, 192.8656526253), (-38.0828139513, 149.2860417825))
        make_face()
    extrude(amount=F17_DEPTH)

    # F19 (through all)
    with Locations(Plane.YZ.offset(38.0828139513)):
        with Locations((-10, 172.8656526253)):
            Hole(F19_D / 2)


solid = Compound([f1.part, f11.part, f17.part])
